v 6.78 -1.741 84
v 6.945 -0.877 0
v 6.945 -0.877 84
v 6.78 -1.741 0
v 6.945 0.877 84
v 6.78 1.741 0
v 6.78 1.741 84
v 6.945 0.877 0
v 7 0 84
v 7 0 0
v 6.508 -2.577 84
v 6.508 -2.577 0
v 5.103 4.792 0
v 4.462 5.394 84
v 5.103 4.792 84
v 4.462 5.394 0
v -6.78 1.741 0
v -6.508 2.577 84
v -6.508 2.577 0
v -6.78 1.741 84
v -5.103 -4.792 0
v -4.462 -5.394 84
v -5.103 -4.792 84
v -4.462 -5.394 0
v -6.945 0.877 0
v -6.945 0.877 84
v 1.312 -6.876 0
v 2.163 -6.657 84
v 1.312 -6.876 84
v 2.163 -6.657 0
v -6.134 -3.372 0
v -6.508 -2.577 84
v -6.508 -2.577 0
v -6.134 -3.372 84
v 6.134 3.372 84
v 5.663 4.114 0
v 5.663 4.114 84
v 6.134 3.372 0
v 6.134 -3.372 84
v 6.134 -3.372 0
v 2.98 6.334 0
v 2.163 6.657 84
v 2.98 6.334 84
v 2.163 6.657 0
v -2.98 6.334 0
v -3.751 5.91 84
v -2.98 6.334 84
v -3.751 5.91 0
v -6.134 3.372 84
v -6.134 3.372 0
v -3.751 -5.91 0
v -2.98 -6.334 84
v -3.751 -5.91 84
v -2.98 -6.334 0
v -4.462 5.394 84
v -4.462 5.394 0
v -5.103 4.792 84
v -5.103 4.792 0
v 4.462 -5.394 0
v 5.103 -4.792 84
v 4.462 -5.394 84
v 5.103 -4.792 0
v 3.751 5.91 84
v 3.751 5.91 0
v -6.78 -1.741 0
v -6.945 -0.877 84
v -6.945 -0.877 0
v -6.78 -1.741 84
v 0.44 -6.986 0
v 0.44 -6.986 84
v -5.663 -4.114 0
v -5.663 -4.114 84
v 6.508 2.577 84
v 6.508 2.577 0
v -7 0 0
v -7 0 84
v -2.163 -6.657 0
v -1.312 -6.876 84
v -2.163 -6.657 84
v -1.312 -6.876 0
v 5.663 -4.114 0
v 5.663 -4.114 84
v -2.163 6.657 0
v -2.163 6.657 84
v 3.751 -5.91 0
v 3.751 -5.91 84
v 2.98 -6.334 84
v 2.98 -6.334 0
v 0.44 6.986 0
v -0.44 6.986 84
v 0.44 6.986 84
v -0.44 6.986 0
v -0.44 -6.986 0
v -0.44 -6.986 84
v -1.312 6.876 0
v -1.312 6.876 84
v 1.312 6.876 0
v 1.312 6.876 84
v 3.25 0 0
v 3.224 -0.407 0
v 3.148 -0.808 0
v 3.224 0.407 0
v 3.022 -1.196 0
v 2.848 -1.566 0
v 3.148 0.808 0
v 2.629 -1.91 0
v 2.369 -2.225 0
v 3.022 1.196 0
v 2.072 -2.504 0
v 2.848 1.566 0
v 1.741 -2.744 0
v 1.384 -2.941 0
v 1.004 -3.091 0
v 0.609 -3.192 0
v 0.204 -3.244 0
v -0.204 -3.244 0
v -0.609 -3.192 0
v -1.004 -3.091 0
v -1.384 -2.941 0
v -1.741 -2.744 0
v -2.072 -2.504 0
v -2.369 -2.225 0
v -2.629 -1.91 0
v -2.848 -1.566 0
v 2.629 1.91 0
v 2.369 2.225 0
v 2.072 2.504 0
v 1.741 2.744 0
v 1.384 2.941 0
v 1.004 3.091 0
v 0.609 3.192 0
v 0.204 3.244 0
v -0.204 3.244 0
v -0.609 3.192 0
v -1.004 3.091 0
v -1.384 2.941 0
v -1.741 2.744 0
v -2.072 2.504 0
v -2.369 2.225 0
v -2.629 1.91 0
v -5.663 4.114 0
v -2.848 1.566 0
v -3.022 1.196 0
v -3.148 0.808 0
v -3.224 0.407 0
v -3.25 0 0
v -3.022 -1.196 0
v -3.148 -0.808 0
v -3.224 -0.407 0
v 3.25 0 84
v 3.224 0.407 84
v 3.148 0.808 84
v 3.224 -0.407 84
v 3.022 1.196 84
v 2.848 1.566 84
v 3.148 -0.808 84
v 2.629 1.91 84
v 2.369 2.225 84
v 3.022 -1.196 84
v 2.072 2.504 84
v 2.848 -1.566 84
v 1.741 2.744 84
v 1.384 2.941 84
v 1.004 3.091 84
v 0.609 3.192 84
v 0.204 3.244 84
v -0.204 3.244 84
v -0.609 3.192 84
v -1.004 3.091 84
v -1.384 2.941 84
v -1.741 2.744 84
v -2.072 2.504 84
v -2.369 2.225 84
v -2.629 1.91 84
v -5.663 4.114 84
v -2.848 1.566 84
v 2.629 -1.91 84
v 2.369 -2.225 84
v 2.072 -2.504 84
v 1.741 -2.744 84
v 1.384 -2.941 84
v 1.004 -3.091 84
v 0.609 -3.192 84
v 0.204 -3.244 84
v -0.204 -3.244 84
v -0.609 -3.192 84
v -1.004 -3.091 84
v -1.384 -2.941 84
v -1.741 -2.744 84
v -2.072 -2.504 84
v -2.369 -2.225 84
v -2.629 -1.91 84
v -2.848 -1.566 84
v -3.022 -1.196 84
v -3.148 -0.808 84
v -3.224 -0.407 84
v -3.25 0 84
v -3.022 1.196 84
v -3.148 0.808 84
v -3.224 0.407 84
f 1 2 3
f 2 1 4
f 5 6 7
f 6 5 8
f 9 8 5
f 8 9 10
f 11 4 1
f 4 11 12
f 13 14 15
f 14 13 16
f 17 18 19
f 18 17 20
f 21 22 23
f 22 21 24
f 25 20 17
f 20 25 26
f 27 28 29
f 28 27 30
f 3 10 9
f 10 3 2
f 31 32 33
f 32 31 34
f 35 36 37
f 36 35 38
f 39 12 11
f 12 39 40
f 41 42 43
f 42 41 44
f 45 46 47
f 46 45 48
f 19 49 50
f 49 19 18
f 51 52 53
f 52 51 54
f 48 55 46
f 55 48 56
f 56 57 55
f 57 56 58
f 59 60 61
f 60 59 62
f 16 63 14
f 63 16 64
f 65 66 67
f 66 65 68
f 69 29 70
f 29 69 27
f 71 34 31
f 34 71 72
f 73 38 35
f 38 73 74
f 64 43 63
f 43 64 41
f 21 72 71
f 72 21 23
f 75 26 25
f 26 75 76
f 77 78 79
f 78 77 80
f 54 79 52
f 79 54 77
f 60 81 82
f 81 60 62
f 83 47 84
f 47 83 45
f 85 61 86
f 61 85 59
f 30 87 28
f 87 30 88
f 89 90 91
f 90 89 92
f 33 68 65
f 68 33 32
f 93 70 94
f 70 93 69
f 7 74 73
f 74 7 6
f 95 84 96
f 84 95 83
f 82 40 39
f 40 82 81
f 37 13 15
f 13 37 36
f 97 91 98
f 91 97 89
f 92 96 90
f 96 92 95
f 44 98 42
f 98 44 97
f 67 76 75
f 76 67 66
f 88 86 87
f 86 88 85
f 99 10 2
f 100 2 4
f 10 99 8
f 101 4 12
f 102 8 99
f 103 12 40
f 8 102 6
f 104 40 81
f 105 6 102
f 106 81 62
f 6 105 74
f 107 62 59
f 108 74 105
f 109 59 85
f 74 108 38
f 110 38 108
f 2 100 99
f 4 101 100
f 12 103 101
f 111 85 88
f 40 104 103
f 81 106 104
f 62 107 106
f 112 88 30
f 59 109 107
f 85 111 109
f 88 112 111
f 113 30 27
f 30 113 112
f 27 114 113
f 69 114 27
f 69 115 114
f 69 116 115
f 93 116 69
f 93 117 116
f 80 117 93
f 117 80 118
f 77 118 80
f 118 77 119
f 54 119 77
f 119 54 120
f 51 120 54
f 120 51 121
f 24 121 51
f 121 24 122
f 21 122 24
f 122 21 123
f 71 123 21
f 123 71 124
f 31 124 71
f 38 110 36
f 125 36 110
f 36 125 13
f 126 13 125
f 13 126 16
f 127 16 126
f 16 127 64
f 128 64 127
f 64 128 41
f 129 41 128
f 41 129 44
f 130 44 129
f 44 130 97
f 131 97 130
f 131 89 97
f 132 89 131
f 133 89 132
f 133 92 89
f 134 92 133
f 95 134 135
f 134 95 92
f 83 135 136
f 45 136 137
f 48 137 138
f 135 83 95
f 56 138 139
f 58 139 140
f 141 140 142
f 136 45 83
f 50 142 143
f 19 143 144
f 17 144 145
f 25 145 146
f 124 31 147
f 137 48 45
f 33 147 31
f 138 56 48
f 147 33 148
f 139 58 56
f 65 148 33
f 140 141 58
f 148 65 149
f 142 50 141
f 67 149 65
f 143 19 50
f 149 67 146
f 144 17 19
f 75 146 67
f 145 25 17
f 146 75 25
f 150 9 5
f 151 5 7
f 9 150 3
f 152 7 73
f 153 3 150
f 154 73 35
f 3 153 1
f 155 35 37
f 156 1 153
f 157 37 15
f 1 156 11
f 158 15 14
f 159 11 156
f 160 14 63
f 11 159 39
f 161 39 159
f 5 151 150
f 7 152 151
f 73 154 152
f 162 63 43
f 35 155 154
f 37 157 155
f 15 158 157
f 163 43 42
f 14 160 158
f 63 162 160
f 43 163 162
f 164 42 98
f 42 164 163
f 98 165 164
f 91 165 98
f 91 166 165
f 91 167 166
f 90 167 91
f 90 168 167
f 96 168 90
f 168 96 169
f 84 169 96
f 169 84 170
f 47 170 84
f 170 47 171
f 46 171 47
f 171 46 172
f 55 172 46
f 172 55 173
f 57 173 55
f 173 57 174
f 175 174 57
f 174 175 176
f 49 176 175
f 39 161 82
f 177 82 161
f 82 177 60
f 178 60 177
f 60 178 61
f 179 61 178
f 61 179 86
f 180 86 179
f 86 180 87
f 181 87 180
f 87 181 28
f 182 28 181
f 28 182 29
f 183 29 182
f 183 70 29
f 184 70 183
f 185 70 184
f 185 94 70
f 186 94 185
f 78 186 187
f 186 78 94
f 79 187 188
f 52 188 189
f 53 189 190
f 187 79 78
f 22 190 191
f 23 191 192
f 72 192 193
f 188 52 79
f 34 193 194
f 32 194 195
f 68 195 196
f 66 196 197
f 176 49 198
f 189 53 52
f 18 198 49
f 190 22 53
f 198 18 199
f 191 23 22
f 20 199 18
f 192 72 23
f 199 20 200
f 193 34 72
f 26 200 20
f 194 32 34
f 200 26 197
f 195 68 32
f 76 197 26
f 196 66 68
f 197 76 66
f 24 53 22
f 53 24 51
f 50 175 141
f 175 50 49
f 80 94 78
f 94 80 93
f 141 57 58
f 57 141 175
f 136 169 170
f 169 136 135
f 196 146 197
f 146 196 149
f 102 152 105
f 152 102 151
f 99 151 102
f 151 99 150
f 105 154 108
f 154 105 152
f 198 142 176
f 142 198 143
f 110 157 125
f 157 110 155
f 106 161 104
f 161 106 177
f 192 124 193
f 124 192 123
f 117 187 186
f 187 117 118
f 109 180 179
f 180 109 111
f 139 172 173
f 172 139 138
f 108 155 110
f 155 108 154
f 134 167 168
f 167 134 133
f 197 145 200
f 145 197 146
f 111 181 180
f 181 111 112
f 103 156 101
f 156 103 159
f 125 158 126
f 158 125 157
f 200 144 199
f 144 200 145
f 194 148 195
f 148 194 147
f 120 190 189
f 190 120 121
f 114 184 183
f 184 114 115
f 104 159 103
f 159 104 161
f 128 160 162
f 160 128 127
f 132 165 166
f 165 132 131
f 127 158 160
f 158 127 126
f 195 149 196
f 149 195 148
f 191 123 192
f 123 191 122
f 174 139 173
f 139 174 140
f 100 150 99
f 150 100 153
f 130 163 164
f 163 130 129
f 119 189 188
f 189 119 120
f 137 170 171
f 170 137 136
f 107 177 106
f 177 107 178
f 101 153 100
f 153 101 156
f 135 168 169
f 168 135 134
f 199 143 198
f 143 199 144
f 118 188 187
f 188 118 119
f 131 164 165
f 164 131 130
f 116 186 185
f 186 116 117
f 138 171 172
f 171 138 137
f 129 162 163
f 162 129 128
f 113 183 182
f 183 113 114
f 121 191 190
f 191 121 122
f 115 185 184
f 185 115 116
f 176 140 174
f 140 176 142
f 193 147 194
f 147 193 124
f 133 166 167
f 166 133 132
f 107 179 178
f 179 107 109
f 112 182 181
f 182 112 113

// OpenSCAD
$fn = 50;


difference() {
	union() {
		cylinder(h = 84, r = 7.0000000000);
	}
	union() {
		translate(v = [0.0000000000, 0.0000000000, -100.0000000000]) {
			cylinder(h = 200, r = 3.2500000000);
		}
	}
}
